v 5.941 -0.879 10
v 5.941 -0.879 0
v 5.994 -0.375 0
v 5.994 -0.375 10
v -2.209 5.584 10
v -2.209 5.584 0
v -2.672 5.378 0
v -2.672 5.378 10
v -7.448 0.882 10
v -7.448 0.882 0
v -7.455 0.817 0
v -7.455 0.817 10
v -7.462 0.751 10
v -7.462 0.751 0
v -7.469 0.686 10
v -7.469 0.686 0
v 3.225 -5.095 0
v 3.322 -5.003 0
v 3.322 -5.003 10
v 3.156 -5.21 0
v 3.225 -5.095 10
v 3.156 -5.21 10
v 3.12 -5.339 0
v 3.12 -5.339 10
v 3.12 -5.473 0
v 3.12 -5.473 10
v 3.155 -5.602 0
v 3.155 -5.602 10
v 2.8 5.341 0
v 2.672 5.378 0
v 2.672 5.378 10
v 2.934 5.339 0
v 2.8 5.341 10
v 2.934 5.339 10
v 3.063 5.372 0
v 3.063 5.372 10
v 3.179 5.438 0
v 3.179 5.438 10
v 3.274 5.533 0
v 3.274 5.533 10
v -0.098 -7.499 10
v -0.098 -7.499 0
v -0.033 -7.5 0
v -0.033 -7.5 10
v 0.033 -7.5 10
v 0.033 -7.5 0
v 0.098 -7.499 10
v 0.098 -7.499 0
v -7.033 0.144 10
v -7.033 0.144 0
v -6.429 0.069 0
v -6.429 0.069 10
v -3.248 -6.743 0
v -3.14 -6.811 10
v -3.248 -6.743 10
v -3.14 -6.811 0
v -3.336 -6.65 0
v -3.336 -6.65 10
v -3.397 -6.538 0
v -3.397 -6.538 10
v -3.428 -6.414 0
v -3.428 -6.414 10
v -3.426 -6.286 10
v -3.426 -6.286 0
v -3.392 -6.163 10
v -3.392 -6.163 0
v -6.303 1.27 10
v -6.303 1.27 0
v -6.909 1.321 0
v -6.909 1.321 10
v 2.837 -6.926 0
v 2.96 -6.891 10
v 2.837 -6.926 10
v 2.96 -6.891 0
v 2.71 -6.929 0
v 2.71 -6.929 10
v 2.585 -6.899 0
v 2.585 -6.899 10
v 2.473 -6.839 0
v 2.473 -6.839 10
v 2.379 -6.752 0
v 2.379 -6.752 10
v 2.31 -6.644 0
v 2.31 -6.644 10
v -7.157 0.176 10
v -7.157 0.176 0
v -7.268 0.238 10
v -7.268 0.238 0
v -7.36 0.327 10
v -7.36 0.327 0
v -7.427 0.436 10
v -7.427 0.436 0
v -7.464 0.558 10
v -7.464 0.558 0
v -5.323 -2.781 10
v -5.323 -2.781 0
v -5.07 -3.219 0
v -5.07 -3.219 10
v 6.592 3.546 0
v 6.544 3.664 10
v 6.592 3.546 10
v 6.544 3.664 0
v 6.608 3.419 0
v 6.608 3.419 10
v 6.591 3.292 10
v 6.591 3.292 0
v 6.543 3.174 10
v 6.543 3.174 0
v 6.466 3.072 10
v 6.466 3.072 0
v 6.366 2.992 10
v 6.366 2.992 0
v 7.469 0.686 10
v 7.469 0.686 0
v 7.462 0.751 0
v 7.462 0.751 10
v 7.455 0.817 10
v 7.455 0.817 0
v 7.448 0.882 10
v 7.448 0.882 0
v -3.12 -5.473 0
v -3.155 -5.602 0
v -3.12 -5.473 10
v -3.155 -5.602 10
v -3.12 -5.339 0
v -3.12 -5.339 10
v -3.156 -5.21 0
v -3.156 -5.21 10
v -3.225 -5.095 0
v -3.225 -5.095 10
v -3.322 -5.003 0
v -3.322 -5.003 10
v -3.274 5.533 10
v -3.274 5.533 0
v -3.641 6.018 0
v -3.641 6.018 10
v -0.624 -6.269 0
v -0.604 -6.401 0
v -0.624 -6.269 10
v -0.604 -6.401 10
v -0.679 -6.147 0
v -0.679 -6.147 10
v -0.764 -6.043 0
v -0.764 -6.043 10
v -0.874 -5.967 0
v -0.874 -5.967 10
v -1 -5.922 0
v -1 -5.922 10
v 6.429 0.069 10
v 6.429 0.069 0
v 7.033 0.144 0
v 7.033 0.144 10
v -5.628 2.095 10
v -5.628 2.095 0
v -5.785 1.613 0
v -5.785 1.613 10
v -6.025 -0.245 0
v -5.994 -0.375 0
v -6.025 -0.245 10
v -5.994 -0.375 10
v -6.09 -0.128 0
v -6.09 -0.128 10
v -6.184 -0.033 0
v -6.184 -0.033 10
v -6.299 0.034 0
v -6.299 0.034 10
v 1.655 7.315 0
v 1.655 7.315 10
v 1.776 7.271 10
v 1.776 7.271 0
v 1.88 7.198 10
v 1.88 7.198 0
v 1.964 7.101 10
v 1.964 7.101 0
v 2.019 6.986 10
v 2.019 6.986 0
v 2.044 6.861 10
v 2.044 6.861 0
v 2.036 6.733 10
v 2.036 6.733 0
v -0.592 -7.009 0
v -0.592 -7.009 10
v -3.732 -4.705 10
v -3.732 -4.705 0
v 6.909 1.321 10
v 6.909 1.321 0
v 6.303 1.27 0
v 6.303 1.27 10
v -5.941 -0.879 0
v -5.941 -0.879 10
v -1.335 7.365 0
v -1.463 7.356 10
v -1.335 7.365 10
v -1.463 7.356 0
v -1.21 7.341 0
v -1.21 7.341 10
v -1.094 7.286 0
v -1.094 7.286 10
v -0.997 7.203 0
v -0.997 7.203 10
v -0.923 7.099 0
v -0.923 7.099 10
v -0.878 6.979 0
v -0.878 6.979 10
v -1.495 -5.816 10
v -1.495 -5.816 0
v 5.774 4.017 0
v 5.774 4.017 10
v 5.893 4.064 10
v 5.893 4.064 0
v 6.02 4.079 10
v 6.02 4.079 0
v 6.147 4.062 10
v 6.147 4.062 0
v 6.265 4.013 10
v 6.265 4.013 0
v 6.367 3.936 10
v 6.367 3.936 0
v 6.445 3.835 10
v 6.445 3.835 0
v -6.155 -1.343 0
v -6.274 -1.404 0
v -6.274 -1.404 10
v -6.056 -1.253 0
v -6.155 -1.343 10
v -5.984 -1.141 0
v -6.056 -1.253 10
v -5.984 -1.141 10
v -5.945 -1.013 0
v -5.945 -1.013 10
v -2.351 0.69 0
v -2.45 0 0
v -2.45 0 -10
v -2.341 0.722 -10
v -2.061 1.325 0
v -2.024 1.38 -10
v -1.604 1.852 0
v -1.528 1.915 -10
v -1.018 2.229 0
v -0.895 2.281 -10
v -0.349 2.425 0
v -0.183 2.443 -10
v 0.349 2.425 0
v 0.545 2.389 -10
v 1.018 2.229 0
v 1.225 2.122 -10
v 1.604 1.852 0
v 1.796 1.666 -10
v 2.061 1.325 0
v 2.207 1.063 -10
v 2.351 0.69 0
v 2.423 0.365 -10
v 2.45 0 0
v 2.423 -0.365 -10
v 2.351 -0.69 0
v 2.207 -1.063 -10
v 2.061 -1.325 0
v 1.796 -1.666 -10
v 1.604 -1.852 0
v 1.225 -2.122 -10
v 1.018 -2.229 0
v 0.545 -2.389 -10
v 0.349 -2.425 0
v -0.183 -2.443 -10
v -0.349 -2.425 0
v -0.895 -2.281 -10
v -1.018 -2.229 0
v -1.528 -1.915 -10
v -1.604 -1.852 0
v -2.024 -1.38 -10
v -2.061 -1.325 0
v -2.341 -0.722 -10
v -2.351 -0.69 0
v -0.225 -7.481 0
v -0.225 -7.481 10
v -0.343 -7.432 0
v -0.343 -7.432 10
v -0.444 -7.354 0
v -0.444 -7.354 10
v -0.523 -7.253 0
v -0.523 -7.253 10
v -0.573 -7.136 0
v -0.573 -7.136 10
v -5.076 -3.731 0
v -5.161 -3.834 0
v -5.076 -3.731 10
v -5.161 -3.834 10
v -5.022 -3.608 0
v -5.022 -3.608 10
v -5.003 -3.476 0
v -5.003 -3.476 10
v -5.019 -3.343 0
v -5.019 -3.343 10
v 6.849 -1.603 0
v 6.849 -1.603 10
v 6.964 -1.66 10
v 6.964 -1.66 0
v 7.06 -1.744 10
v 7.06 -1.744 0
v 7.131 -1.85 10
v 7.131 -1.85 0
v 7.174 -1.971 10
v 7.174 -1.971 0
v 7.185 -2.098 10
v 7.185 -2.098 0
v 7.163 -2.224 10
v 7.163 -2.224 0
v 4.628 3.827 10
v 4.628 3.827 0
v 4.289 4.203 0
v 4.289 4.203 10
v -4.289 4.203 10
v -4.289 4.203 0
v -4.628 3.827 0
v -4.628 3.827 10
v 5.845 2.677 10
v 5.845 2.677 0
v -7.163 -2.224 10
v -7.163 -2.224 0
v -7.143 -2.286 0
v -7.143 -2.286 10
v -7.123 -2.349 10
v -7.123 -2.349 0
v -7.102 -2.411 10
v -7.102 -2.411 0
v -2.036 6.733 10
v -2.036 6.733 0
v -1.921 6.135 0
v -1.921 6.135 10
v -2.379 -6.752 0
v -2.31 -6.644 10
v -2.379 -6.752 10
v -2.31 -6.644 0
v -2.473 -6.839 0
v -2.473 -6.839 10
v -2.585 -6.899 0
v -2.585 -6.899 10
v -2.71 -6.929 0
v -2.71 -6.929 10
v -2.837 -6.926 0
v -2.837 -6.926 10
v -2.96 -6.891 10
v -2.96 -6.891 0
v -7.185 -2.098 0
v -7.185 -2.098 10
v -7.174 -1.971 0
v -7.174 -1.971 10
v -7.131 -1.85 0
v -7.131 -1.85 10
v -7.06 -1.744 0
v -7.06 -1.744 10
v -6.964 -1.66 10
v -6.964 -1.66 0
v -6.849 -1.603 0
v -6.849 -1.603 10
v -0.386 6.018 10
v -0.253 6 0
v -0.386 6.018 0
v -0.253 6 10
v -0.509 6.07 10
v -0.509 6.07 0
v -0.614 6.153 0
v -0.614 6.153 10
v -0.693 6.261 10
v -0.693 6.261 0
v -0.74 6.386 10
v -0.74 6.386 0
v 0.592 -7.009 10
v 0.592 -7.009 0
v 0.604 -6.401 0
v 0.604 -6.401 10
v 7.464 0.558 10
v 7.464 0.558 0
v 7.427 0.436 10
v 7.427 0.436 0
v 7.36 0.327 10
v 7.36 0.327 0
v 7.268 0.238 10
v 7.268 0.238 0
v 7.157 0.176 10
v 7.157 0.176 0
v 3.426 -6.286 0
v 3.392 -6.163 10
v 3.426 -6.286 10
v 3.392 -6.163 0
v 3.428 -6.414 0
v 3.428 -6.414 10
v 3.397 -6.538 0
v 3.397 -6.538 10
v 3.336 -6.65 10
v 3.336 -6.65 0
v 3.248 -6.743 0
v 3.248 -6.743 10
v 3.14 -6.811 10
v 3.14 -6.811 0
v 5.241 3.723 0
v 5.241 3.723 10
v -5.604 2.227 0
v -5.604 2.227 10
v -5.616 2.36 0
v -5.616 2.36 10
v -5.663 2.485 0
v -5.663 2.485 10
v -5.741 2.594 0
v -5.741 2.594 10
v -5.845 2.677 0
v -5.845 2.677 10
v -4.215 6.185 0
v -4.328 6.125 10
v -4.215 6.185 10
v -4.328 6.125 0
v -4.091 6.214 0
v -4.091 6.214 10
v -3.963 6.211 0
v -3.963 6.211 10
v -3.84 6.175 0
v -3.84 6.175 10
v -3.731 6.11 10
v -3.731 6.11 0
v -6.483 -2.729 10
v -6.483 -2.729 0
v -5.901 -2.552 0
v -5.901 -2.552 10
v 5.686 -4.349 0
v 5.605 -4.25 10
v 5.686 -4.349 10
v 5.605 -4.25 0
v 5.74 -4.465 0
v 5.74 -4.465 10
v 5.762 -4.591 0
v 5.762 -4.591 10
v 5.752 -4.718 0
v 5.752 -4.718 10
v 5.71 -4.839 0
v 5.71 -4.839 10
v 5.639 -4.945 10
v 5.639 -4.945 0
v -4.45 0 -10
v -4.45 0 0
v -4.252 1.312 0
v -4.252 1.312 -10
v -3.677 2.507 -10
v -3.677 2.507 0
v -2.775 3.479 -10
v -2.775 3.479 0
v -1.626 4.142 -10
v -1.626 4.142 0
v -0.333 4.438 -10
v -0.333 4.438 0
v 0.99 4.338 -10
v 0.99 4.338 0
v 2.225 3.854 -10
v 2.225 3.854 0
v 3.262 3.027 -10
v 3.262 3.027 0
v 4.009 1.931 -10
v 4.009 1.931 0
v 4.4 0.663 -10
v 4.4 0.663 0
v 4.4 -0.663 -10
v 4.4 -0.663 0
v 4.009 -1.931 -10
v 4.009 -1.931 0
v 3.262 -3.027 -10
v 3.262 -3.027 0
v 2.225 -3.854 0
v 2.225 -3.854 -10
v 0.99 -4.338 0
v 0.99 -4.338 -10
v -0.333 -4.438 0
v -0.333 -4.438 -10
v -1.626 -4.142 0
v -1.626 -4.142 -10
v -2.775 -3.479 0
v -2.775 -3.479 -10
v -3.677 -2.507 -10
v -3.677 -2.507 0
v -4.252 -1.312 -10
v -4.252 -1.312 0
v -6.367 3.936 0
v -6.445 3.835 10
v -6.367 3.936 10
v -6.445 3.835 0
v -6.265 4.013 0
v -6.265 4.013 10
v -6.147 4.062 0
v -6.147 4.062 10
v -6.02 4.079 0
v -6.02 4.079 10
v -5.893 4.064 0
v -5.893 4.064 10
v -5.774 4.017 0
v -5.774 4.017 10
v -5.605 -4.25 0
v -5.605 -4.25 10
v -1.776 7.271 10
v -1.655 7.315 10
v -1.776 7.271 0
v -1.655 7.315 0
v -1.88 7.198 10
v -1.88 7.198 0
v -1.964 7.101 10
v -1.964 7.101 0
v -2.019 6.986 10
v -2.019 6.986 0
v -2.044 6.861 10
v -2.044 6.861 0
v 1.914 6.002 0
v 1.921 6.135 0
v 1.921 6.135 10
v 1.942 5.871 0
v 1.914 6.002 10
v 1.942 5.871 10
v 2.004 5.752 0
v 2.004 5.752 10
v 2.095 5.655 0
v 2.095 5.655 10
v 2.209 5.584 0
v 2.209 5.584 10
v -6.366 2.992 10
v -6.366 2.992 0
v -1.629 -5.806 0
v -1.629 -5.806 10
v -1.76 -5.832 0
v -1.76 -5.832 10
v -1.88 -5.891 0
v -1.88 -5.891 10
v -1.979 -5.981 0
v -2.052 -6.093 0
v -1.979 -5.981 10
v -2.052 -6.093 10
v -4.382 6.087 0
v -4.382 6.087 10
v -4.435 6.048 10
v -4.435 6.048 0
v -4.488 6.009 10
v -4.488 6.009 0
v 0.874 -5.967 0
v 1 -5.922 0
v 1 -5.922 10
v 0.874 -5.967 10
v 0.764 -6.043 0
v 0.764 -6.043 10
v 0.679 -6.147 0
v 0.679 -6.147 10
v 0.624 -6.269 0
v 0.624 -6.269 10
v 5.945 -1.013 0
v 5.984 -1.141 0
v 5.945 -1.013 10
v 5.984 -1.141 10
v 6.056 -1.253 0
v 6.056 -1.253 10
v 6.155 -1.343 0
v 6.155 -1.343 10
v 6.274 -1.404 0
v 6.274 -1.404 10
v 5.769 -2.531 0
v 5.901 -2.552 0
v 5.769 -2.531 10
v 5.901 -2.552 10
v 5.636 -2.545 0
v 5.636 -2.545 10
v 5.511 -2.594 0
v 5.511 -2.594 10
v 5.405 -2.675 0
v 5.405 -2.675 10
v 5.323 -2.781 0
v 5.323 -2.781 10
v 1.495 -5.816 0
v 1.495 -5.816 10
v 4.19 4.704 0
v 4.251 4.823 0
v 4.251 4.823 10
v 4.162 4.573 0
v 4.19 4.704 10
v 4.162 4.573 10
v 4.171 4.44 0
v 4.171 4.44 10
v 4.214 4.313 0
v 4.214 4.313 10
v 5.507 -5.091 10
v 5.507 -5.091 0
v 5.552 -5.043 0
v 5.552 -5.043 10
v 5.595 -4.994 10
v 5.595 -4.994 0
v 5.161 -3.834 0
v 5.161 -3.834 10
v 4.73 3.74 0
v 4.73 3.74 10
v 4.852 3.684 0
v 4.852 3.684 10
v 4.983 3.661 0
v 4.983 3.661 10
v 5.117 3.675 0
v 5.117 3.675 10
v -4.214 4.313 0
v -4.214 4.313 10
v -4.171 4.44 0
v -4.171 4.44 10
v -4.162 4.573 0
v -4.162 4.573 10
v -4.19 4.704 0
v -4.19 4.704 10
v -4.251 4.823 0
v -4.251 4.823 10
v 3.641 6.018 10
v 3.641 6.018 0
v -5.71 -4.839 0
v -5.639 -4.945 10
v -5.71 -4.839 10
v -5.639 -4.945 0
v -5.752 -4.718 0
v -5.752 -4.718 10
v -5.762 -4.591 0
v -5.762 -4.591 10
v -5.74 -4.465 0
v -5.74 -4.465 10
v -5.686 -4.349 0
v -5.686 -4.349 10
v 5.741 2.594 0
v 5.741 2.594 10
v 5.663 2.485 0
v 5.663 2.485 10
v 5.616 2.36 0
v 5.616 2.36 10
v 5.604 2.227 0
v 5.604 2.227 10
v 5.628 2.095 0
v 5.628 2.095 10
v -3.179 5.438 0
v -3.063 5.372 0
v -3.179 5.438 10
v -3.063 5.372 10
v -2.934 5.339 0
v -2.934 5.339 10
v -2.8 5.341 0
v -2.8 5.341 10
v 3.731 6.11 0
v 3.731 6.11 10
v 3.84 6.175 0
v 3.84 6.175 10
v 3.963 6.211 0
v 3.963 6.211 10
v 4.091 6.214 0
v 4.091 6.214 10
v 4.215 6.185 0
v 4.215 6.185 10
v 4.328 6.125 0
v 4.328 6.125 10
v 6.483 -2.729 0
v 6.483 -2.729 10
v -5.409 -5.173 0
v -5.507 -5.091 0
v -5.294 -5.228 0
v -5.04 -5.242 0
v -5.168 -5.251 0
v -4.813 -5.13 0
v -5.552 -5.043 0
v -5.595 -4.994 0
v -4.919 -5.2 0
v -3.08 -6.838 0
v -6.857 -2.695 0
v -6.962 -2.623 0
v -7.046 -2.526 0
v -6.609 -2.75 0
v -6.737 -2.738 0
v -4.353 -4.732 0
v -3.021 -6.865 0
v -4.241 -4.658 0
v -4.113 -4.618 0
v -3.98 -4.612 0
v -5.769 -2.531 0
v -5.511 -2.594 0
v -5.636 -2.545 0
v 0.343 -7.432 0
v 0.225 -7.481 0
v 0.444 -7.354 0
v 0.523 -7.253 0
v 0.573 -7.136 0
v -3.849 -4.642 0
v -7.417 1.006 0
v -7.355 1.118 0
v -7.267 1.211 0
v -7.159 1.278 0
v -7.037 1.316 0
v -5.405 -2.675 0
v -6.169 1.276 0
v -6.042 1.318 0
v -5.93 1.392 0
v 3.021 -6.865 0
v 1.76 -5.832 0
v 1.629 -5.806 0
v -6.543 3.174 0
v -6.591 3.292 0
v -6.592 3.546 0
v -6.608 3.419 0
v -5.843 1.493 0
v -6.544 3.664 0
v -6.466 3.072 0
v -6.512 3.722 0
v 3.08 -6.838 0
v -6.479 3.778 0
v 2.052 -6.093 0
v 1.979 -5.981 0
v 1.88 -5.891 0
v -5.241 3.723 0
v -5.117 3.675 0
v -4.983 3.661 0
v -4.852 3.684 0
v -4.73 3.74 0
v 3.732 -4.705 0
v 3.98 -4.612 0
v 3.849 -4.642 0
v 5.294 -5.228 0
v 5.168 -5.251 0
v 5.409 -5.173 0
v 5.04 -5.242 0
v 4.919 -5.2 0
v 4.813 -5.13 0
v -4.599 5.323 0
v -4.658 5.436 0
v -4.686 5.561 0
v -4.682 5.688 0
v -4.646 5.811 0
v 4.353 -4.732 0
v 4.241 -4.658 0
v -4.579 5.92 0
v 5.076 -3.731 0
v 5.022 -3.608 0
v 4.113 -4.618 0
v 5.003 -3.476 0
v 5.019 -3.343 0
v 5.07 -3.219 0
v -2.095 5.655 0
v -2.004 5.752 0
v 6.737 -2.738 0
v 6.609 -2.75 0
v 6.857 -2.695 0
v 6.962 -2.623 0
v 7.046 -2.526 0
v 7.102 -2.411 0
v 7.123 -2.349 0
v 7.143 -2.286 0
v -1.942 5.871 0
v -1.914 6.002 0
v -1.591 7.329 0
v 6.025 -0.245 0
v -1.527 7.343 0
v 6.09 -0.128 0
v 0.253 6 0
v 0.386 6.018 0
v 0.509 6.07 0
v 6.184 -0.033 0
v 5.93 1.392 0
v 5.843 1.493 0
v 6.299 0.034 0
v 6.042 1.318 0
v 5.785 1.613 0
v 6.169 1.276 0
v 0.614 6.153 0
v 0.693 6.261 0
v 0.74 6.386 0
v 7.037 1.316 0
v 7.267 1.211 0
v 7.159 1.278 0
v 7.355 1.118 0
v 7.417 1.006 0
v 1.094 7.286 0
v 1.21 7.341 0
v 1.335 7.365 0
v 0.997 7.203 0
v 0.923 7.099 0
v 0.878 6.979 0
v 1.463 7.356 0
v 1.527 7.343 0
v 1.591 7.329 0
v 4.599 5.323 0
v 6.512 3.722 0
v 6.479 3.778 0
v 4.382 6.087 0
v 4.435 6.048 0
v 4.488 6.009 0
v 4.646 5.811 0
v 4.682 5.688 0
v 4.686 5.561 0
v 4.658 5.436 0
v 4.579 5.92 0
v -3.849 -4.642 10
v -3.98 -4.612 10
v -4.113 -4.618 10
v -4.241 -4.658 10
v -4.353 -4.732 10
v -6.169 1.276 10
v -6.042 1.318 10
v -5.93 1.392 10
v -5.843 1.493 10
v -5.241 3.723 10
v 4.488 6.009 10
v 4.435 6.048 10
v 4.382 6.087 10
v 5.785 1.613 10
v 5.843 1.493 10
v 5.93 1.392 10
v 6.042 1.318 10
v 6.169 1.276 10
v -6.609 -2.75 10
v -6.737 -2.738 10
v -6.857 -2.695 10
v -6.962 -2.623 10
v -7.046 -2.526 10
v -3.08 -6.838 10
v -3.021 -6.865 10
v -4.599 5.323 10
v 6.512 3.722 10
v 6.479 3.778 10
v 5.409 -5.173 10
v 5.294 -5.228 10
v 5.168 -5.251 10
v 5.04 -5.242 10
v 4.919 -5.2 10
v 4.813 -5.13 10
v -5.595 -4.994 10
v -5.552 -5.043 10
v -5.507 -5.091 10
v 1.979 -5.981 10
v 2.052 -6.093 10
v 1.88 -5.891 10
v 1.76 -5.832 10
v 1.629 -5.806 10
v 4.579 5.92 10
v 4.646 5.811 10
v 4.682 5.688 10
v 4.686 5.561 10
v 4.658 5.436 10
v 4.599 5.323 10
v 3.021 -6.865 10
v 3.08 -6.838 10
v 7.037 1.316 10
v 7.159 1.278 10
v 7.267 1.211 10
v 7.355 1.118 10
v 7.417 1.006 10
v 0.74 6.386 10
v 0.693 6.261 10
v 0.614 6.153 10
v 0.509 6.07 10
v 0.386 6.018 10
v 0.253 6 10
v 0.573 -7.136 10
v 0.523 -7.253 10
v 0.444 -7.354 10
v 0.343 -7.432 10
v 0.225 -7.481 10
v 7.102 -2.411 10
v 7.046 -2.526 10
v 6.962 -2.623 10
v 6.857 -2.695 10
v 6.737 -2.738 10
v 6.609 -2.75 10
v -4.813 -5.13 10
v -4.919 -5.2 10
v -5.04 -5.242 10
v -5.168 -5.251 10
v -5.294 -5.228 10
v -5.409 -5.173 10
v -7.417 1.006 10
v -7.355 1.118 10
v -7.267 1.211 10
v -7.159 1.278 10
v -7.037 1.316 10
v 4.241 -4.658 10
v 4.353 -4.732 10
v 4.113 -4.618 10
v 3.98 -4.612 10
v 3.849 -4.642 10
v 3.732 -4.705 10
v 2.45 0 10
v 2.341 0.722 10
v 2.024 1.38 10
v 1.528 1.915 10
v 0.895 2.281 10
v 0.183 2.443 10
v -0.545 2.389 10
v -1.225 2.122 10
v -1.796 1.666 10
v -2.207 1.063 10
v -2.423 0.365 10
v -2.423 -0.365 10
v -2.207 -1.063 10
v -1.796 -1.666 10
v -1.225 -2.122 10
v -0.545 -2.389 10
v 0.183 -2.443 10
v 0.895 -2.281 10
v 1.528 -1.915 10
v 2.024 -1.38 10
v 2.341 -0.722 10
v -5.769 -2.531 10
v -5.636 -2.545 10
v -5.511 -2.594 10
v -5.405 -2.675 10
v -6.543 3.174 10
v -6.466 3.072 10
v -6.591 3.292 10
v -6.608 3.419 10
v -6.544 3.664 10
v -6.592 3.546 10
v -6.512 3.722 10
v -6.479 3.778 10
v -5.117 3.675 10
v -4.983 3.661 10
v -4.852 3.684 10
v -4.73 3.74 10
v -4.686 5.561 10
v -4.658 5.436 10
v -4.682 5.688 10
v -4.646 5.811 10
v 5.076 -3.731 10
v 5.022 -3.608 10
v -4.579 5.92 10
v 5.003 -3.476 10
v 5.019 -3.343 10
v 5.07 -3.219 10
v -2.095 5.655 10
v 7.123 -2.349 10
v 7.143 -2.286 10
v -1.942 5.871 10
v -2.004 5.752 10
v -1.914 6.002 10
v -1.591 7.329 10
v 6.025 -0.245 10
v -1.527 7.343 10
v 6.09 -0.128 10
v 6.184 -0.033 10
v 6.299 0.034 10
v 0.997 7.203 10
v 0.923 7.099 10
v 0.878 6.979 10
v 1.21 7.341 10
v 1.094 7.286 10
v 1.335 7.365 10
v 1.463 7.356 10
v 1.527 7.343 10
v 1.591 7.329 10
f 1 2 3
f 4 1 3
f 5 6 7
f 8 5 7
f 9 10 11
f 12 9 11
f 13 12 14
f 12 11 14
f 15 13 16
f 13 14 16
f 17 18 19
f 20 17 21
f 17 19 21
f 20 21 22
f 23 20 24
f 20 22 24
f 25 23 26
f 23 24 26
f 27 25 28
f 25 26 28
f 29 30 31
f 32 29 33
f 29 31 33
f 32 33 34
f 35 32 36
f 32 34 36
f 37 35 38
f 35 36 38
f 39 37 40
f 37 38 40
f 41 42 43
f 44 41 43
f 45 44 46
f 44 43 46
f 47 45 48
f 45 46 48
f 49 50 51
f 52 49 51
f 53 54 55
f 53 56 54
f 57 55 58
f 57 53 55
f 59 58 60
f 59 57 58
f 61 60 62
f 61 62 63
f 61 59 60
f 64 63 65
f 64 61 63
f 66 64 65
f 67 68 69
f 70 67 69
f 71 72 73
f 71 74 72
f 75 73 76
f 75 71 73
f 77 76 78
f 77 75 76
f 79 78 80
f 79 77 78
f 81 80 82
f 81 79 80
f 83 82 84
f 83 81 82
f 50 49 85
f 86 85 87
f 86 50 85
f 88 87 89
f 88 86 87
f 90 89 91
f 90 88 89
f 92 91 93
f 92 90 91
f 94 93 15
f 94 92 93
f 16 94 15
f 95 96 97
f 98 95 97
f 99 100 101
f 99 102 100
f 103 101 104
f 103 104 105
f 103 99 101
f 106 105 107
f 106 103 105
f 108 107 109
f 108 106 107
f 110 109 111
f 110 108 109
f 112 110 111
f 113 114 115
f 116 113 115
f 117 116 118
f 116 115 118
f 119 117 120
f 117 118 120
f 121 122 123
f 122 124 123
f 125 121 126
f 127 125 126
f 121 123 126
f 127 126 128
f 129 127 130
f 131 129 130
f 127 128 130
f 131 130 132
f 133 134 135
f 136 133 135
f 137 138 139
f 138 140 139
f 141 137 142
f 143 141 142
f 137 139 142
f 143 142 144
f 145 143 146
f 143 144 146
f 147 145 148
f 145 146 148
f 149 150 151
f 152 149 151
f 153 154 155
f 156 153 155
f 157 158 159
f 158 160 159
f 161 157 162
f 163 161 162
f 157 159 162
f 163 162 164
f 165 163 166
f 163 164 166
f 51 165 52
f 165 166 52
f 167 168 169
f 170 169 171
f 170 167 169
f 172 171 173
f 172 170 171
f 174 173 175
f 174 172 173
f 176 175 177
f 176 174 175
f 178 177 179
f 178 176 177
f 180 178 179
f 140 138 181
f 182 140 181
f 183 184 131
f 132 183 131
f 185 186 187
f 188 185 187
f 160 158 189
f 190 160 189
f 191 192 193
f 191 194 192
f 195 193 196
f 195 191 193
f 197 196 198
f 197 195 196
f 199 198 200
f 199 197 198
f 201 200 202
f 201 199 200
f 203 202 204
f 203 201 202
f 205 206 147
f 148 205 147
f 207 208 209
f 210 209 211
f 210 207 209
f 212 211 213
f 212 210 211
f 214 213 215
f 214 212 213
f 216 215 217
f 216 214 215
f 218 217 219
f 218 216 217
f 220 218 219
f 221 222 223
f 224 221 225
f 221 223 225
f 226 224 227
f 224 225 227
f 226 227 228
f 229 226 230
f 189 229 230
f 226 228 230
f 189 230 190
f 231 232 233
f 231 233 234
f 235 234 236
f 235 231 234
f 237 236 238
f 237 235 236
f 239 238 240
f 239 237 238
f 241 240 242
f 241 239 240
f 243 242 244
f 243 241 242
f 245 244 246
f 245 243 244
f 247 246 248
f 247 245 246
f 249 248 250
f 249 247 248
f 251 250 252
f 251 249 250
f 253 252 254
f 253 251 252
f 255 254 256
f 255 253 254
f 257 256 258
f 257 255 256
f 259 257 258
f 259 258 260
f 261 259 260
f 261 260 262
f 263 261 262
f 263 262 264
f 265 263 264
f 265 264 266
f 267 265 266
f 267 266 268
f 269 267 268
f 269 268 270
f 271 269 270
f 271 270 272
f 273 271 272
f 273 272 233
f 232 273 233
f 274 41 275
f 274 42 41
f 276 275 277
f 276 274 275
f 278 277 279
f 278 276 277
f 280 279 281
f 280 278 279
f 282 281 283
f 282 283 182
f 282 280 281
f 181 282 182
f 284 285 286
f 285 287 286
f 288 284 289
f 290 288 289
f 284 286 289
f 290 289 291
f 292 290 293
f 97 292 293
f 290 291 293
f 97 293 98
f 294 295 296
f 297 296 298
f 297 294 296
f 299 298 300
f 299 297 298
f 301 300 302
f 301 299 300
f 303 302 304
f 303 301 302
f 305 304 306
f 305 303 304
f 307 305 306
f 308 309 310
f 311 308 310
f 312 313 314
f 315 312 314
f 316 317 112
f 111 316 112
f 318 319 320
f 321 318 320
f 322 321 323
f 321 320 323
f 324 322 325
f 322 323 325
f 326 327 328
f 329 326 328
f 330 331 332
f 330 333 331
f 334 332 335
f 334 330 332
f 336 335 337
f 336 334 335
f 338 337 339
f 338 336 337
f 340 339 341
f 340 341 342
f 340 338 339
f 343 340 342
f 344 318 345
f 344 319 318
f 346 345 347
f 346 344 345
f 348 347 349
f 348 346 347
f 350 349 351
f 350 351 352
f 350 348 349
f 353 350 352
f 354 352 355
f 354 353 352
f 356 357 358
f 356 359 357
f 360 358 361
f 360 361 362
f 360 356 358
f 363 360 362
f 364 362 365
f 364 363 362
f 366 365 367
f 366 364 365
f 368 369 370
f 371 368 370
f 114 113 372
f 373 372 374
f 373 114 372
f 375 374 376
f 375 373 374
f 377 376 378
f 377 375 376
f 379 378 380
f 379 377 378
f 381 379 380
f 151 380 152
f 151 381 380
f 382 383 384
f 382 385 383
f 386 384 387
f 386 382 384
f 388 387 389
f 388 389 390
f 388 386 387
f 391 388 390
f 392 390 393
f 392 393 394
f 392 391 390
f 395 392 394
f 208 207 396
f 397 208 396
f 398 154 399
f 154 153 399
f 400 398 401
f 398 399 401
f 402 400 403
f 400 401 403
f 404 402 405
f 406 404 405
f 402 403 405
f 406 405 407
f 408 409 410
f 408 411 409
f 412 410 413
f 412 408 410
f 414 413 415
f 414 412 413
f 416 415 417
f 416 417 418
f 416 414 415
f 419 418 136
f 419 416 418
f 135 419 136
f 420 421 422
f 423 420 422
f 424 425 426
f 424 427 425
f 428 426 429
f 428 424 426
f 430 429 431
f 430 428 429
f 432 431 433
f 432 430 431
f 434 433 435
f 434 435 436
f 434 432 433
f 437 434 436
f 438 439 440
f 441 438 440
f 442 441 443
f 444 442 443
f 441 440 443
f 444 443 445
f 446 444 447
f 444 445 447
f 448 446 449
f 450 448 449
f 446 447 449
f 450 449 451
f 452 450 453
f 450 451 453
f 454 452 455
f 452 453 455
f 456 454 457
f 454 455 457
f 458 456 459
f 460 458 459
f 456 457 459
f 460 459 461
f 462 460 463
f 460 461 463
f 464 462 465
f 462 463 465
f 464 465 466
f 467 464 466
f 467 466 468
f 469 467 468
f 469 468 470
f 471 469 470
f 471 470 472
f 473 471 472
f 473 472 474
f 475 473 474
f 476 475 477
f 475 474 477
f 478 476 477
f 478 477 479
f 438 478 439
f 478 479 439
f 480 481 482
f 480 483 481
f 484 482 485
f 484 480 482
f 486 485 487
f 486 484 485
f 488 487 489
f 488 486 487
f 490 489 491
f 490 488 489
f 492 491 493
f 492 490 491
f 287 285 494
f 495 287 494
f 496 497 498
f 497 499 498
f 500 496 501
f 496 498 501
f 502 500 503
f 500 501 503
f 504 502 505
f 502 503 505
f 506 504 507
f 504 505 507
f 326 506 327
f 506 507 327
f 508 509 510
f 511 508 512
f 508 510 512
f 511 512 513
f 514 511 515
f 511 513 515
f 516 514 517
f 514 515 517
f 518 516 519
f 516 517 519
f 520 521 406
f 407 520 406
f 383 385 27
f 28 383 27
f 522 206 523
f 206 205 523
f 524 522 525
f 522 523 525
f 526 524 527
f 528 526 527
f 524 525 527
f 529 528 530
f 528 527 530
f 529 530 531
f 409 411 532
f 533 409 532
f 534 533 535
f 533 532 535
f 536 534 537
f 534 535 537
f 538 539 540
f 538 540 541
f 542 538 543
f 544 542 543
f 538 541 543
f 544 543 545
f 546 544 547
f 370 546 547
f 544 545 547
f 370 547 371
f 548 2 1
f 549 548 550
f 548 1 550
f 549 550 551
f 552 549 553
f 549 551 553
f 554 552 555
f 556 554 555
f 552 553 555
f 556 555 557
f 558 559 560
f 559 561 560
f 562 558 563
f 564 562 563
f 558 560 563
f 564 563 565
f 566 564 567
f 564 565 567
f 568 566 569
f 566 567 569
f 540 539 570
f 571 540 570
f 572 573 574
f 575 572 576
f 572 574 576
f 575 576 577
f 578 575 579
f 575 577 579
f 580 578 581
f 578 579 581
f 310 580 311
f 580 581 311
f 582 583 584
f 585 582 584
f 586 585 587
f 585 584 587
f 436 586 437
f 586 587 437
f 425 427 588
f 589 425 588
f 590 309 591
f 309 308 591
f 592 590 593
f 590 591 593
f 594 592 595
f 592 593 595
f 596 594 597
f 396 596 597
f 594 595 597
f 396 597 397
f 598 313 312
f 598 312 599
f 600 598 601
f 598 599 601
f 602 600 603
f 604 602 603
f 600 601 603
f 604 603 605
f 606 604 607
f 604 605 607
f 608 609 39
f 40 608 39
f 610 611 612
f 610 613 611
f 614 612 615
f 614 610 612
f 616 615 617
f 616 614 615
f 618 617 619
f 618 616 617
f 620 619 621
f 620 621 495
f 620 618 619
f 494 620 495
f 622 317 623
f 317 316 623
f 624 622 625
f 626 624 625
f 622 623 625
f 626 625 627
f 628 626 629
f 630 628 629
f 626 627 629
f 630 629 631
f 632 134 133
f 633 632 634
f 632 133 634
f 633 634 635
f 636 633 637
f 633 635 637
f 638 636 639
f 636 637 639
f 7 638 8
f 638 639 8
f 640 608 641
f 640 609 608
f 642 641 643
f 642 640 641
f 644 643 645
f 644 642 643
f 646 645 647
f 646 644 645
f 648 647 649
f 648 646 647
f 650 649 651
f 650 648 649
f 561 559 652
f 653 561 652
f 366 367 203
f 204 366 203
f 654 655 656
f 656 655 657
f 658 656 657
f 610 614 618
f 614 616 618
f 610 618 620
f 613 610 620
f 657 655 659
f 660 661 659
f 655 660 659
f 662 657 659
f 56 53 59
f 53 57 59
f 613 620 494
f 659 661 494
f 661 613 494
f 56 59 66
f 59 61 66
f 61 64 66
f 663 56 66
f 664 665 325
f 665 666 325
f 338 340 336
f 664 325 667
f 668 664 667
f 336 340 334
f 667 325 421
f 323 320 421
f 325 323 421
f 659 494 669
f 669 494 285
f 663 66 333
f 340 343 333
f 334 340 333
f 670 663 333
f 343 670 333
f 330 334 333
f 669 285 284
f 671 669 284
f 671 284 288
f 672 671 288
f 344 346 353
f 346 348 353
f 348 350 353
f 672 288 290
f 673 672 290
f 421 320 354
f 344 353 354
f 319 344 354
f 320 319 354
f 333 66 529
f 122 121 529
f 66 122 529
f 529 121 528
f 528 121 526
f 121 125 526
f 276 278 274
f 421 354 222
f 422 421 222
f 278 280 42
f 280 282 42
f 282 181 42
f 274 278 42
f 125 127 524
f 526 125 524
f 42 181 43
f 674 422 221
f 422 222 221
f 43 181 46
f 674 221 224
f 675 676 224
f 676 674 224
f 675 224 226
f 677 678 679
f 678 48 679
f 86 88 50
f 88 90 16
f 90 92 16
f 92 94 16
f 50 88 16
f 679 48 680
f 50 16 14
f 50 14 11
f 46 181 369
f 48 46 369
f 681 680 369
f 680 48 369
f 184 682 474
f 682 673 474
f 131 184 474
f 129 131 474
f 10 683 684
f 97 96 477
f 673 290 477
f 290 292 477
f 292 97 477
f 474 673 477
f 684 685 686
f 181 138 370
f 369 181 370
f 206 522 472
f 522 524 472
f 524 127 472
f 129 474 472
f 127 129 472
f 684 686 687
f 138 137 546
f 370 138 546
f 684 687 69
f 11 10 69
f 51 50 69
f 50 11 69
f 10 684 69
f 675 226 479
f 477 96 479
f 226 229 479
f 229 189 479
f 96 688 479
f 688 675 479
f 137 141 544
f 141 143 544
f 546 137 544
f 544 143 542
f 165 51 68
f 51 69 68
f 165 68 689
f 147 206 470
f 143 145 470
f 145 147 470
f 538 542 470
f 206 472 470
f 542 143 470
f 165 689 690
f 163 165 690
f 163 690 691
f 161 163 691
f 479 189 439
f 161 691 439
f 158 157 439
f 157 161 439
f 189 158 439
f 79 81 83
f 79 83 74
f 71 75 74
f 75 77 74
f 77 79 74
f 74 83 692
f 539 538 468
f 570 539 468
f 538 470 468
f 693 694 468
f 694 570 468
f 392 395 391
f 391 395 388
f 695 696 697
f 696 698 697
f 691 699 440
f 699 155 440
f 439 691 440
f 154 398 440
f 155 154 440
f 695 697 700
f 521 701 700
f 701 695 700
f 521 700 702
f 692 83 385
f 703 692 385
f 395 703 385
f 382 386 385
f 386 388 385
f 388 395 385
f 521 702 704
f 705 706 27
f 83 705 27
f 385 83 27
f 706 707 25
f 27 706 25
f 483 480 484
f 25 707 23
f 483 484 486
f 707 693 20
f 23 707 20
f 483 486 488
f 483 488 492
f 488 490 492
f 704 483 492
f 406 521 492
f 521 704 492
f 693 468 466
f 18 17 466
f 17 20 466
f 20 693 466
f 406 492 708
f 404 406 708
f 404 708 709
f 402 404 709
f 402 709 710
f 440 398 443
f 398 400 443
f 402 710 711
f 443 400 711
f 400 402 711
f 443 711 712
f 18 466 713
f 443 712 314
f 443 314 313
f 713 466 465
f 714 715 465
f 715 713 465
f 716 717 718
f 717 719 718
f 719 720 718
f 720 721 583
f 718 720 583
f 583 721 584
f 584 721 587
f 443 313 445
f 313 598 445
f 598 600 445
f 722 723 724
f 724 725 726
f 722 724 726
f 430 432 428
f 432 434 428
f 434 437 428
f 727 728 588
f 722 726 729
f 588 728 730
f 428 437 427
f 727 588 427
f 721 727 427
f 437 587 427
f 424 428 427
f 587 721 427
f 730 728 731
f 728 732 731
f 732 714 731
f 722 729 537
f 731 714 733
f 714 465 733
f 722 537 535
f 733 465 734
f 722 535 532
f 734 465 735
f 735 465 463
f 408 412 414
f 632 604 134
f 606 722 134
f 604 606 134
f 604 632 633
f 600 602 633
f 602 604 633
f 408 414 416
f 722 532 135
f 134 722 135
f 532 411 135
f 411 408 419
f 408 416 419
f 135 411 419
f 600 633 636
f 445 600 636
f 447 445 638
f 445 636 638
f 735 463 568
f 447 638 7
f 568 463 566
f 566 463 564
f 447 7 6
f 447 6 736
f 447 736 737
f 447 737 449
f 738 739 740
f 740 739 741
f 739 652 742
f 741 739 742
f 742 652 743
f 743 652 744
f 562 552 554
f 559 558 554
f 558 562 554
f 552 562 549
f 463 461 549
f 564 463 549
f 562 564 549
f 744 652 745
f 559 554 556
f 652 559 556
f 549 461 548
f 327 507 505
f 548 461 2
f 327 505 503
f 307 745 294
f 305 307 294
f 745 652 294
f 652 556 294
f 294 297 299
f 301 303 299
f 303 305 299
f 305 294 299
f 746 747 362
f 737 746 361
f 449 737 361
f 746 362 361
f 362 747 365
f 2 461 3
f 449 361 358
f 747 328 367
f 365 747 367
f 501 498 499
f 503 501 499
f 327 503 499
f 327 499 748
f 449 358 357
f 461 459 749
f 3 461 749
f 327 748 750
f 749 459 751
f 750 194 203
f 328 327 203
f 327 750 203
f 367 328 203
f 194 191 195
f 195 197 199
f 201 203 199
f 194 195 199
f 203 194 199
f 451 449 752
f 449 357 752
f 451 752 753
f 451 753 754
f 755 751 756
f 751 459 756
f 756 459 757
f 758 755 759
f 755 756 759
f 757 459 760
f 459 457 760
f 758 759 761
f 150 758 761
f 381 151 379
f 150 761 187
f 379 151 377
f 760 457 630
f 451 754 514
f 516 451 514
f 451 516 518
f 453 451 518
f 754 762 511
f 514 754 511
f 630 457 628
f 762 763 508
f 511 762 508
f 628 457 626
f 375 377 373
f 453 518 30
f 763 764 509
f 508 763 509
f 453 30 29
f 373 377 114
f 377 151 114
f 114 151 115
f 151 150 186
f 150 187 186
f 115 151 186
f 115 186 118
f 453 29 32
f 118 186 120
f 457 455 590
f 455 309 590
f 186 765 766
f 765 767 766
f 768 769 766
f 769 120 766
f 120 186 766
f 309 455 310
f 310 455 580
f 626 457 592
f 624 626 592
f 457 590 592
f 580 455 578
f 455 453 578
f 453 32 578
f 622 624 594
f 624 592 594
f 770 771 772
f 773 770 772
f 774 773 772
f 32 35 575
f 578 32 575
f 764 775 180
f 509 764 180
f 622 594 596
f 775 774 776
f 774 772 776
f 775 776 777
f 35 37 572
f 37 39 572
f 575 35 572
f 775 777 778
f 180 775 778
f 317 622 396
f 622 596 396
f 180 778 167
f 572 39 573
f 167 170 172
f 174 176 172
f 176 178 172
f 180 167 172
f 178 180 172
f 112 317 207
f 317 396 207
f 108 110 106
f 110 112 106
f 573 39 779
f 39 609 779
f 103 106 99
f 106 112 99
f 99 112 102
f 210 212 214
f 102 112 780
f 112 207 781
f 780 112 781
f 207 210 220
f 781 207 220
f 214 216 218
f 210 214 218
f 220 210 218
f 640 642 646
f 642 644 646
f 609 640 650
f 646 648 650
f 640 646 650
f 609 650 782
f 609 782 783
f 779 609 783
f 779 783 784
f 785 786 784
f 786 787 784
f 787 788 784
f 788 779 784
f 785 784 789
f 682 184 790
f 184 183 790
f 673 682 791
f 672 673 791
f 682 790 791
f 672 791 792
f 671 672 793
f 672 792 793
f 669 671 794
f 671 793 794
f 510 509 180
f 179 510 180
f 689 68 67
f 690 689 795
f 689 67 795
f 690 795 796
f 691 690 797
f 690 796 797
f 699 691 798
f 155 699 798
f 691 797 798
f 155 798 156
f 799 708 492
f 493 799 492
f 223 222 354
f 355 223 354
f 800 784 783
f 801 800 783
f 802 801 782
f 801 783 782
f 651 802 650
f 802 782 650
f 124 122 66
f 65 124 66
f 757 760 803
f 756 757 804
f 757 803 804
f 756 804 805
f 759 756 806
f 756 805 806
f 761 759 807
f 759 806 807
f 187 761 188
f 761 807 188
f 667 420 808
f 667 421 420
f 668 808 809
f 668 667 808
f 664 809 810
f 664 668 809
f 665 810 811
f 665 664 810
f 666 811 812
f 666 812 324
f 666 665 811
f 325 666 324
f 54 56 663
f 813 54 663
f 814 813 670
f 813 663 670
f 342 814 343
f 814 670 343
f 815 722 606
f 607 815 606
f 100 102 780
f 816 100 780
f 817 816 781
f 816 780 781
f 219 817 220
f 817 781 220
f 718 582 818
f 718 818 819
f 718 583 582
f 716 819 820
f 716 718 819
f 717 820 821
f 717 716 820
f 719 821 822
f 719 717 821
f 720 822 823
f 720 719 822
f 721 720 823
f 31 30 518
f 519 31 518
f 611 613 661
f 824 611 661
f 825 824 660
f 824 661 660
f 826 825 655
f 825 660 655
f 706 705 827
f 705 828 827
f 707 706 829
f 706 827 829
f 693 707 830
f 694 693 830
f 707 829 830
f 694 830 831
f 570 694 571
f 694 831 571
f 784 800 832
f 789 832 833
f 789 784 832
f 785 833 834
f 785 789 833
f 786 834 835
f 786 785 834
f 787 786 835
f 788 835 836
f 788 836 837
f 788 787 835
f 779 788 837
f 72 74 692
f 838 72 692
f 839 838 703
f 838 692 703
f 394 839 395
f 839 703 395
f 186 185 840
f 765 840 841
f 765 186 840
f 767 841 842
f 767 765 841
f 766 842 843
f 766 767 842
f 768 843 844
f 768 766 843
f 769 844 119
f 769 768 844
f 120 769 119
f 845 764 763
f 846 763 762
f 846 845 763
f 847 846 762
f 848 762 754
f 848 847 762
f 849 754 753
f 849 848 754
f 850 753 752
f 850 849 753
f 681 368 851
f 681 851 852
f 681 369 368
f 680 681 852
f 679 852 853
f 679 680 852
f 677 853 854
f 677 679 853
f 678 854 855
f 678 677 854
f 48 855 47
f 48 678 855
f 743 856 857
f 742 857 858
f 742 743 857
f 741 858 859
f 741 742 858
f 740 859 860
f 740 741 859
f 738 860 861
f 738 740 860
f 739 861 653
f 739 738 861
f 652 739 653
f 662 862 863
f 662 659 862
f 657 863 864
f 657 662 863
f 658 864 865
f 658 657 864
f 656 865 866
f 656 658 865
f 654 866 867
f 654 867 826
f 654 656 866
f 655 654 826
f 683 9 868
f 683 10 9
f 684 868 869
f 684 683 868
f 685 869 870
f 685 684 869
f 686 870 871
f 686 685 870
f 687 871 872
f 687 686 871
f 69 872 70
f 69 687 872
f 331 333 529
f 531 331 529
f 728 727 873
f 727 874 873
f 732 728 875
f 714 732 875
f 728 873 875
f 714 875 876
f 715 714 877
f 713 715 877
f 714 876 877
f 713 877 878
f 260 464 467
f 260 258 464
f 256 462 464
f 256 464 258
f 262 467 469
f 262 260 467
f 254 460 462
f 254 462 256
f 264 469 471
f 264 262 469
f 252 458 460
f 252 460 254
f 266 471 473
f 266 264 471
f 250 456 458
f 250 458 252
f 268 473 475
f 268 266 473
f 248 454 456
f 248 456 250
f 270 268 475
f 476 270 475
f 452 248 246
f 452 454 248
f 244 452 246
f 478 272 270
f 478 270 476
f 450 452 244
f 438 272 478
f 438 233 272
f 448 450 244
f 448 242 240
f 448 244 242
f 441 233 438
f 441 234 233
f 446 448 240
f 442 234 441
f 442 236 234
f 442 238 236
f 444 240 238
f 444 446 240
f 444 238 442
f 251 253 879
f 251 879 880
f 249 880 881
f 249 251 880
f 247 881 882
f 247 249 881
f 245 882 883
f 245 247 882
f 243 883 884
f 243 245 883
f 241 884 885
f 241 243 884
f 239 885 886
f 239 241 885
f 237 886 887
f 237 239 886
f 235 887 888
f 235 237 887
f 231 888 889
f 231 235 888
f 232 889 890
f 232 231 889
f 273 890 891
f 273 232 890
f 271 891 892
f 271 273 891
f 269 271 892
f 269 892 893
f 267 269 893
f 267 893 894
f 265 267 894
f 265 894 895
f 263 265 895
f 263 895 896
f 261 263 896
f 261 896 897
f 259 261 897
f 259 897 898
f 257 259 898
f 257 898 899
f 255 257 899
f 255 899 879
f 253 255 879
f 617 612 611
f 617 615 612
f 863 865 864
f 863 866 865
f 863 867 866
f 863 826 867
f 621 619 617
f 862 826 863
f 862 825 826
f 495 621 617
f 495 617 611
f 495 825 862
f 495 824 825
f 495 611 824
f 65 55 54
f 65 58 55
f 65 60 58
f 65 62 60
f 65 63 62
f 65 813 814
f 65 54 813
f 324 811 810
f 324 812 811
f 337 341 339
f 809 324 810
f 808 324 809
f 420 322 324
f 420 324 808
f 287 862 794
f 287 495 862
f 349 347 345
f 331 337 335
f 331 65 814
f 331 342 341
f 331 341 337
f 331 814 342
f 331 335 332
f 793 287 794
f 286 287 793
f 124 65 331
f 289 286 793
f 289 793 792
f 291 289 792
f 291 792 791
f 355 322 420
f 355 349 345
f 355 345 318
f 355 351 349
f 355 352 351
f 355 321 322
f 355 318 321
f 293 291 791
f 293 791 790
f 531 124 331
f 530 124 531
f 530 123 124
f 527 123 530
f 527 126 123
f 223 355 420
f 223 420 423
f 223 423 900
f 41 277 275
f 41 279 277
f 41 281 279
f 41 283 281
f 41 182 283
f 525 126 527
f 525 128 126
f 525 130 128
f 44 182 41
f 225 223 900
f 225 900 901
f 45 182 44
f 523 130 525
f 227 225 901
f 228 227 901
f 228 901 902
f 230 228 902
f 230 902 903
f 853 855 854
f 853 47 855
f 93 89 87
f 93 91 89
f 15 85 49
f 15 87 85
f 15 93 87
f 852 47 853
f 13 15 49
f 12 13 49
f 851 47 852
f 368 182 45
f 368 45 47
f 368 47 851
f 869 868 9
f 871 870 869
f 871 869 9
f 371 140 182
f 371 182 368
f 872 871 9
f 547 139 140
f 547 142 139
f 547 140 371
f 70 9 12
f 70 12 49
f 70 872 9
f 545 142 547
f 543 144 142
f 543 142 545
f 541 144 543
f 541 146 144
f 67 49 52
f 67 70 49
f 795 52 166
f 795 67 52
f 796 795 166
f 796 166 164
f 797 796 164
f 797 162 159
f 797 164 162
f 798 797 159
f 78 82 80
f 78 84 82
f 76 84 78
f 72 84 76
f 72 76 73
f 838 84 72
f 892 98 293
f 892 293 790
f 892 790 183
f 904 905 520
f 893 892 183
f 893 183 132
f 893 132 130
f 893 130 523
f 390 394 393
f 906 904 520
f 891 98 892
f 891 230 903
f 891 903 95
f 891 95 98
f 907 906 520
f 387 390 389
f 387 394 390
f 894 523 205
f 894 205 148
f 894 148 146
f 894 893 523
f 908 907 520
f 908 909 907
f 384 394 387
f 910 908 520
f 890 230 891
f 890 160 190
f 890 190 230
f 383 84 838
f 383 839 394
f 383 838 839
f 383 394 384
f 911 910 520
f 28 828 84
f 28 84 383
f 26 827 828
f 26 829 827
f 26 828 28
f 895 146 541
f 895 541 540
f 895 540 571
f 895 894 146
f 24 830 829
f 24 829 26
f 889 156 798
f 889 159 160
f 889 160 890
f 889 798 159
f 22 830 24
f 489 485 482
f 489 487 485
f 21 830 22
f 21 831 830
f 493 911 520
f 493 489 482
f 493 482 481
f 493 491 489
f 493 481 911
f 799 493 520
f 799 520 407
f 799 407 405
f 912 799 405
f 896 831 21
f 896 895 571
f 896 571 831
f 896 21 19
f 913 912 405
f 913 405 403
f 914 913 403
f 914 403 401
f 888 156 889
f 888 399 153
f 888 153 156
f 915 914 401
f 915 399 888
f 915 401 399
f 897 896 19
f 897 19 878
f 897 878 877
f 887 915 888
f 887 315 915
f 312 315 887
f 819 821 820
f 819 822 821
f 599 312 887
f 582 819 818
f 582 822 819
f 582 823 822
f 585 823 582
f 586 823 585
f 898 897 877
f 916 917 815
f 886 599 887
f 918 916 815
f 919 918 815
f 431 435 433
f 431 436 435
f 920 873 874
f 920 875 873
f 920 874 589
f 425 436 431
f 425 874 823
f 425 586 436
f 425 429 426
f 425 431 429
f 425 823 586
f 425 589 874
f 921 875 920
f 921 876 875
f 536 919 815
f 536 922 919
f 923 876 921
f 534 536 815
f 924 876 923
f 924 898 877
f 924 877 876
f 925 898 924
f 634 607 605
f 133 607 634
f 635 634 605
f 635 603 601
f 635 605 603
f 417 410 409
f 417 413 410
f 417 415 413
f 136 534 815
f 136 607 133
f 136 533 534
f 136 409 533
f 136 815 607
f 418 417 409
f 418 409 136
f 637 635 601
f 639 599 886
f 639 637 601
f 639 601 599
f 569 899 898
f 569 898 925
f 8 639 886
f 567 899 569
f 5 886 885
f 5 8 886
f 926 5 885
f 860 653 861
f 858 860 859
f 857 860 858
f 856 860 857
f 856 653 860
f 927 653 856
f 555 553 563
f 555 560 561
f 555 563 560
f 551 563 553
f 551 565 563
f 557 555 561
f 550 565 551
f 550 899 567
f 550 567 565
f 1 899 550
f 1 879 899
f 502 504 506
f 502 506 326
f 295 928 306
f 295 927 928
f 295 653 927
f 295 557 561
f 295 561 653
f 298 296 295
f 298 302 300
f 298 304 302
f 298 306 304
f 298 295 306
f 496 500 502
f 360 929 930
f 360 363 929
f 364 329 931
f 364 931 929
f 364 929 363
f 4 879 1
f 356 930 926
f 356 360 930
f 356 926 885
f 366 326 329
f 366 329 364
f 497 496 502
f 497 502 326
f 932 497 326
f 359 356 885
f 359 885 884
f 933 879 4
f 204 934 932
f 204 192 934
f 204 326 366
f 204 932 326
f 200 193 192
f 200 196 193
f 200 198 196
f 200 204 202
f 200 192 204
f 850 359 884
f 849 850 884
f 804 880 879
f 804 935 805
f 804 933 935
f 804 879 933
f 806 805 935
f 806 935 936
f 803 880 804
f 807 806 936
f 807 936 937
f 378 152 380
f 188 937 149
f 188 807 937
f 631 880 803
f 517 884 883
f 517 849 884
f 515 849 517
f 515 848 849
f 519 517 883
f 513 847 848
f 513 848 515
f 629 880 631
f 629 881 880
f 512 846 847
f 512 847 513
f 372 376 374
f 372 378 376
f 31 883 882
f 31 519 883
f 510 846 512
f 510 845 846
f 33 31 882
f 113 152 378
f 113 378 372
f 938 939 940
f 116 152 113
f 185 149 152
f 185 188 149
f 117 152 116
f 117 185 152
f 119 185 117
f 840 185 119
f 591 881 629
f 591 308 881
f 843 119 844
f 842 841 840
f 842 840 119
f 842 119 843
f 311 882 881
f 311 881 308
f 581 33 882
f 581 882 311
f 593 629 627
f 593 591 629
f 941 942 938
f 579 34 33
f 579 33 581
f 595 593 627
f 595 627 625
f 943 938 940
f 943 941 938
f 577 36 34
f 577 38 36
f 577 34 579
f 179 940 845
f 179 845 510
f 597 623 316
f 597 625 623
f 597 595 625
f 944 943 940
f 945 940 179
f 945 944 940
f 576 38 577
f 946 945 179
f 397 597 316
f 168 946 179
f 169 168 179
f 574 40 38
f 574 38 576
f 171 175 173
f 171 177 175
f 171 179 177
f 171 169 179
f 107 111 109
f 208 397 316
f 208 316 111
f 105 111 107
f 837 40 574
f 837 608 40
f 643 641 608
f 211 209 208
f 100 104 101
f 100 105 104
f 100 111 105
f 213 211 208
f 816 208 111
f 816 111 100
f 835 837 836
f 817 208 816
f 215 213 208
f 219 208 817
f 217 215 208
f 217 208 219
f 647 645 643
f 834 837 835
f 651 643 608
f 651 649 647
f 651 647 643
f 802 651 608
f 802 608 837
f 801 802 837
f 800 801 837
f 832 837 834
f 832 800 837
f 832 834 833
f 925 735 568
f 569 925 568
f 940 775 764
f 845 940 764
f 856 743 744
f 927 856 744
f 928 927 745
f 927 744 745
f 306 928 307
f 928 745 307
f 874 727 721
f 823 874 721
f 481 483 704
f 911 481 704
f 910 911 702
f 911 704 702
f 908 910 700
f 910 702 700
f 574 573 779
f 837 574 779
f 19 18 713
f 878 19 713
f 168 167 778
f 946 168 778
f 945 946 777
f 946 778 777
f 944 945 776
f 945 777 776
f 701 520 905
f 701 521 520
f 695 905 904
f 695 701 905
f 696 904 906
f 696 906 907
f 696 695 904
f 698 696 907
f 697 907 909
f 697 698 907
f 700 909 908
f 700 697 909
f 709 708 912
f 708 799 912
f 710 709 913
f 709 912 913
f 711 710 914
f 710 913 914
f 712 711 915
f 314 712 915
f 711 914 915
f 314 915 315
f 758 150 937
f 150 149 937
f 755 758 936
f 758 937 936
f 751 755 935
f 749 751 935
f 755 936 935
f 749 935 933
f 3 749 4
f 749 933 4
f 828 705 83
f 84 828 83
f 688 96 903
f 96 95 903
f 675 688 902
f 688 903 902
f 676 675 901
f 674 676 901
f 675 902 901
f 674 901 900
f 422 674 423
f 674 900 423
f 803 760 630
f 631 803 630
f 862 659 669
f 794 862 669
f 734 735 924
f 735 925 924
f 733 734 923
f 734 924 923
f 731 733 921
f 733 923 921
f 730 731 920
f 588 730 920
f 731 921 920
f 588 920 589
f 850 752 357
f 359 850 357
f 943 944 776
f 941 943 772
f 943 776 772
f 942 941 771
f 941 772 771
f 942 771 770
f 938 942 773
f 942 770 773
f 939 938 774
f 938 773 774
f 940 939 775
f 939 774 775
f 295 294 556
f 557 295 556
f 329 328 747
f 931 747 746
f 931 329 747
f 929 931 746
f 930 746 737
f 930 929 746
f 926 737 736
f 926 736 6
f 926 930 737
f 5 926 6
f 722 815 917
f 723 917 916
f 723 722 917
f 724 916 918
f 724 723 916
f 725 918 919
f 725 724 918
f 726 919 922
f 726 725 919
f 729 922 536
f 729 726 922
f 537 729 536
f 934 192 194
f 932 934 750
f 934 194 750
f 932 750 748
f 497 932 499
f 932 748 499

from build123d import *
from build123d.topology import SkipClean

# Parameters (mm, degrees)
SKETCH1_R                = 7.5
SKETCH1_R_2              = 2.45
BOSS_EXTRUDE1_DEPTH      = 10
CUT_EXTRUDE1_DEPTH       = 10
FILLET1_R                = 0.5
CIRPATTERN1_COUNT        = 15
FILLET1_OF_CIRPATTERN1_R = 0.5
BOSS_EXTRUDE2_START      = 10
SKETCH3_R                = 4.45
SKETCH3_R_2              = 2.45
BOSS_EXTRUDE2_DEPTH      = 10


with BuildPart() as part:
    # Sketch1 → Boss-Extrude1 (new body)
    with BuildSketch(Plane.XY):
        Circle(SKETCH1_R)
        Circle(SKETCH1_R_2, mode=Mode.SUBTRACT)
    extrude(amount=BOSS_EXTRUDE1_DEPTH)

    # Sketch2 → Cut-Extrude1 (cut)
    with BuildSketch(Plane(origin=(0, 0, 0), x_dir=(-1, 0, 0), z_dir=(0, 0, -1))):
        Polygon((-0.65, 6), (0.65, 6), (1, 7.5), (-1, 7.5), align=None)
    cut_extrude1 = extrude(amount=-CUT_EXTRUDE1_DEPTH, mode=Mode.SUBTRACT)

    # Fillet1
    fillet1_edges = [part.edges().sort_by_distance(p)[0] for p in [
        (-0.984846702, 7.435057295, 5),
        (-0.65, 6, 5),
        (0.65, 6, 5),
        (0.984846702, 7.435057295, 5),
    ]]
    fillet(fillet1_edges, radius=FILLET1_R)

    # CirPattern1: Cut-Extrude1 ×15 about axis
    cirpattern1_axis = Axis((0, 0, 10), (0, 0, -1))
    for i in range(1, CIRPATTERN1_COUNT):
        add(cut_extrude1.rotate(cirpattern1_axis, i * 360 / CIRPATTERN1_COUNT), mode=Mode.SUBTRACT)

    # Fillet1 of CirPattern1
    fillet1_of_cirpattern1_edges = [part.edges().sort_by_distance(p)[0] for p in [
        (2.124408014, 7.19283606, 5),
        (1.846615311, 5.745651564, 5),
        (3.034224406, 5.216893928, 5),
        (3.923812476, 6.391689577, 5),
        (4.866333285, 5.706908126, 5),
        (4.023934059, 4.497827775, 5),
        (4.893803847, 3.531739502, 5),
        (6.184315427, 4.243140665, 5),
        (6.766825321, 3.234203932, 5),
        (5.505478051, 2.472288702, 5),
        (5.907200144, 1.235915231, 5),
        (7.375494057, 1.360914185, 5),
        (7.497271785, 0.202276495, 5),
        (6.035074873, 0.019268452, 5),
        (5.899187871, -1.273610012, 5),
        (7.29138276, -1.756626722, 5),
        (6.931371847, -2.864626384, 5),
        (5.521152423, -2.437083488, 5),
        (4.871152423, -3.562916512, 5),
        (5.946525145, -4.57043091, 5),
        (5.166974747, -5.436209338, 5),
        (4.05257256, -4.472041552, 5),
        (3.000850467, -5.23616238, 5),
        (3.573459309, -6.593966073, 5),
        (2.509160772, -7.067822311, 5),
        (1.883266085, -5.733743005, 5),
        (0.611674204, -6.004028203, 5),
        (0.582509895, -7.477344597, 5),
        (-0.582509895, -7.477344597, 5),
        (-0.611674204, -6.004028203, 5),
        (-1.883266085, -5.733743005, 5),
        (-2.509160772, -7.067822311, 5),
        (-3.573459309, -6.593966073, 5),
        (-3.000850467, -5.23616238, 5),
        (-4.05257256, -4.472041552, 5),
        (-5.166974747, -5.436209338, 5),
        (-5.946525145, -4.57043091, 5),
        (-4.871152423, -3.562916512, 5),
        (-5.521152423, -2.437083488, 5),
        (-6.931371847, -2.864626384, 5),
        (-7.29138276, -1.756626722, 5),
        (-5.899187871, -1.273610012, 5),
        (-6.035074873, 0.019268452, 5),
        (-7.497271785, 0.202276495, 5),
        (-7.375494057, 1.360914185, 5),
        (-5.907200144, 1.235915231, 5),
        (-5.505478051, 2.472288702, 5),
        (-6.766825321, 3.234203932, 5),
        (-6.184315427, 4.243140665, 5),
        (-4.893803847, 3.531739502, 5),
        (-4.023934059, 4.497827775, 5),
        (-4.866333285, 5.706908126, 5),
        (-3.923812476, 6.391689577, 5),
        (-3.034224406, 5.216893928, 5),
        (-1.846615311, 5.745651564, 5),
        (-2.124408014, 7.19283606, 5),
    ]]
    fillet(fillet1_of_cirpattern1_edges, radius=FILLET1_OF_CIRPATTERN1_R)

    # Sketch3 → Boss-Extrude2 (add)
    with SkipClean():  # the faces are left unmerged after this step: merging them gives an invalid solid
        with BuildSketch(Plane(origin=(0, 0, 0), x_dir=(-1, 0, 0), z_dir=(0, 0, -1)).offset(BOSS_EXTRUDE2_START)):
            Circle(SKETCH3_R)
            Circle(SKETCH3_R_2, mode=Mode.SUBTRACT)
        extrude(amount=-BOSS_EXTRUDE2_DEPTH)


solid = part.part
